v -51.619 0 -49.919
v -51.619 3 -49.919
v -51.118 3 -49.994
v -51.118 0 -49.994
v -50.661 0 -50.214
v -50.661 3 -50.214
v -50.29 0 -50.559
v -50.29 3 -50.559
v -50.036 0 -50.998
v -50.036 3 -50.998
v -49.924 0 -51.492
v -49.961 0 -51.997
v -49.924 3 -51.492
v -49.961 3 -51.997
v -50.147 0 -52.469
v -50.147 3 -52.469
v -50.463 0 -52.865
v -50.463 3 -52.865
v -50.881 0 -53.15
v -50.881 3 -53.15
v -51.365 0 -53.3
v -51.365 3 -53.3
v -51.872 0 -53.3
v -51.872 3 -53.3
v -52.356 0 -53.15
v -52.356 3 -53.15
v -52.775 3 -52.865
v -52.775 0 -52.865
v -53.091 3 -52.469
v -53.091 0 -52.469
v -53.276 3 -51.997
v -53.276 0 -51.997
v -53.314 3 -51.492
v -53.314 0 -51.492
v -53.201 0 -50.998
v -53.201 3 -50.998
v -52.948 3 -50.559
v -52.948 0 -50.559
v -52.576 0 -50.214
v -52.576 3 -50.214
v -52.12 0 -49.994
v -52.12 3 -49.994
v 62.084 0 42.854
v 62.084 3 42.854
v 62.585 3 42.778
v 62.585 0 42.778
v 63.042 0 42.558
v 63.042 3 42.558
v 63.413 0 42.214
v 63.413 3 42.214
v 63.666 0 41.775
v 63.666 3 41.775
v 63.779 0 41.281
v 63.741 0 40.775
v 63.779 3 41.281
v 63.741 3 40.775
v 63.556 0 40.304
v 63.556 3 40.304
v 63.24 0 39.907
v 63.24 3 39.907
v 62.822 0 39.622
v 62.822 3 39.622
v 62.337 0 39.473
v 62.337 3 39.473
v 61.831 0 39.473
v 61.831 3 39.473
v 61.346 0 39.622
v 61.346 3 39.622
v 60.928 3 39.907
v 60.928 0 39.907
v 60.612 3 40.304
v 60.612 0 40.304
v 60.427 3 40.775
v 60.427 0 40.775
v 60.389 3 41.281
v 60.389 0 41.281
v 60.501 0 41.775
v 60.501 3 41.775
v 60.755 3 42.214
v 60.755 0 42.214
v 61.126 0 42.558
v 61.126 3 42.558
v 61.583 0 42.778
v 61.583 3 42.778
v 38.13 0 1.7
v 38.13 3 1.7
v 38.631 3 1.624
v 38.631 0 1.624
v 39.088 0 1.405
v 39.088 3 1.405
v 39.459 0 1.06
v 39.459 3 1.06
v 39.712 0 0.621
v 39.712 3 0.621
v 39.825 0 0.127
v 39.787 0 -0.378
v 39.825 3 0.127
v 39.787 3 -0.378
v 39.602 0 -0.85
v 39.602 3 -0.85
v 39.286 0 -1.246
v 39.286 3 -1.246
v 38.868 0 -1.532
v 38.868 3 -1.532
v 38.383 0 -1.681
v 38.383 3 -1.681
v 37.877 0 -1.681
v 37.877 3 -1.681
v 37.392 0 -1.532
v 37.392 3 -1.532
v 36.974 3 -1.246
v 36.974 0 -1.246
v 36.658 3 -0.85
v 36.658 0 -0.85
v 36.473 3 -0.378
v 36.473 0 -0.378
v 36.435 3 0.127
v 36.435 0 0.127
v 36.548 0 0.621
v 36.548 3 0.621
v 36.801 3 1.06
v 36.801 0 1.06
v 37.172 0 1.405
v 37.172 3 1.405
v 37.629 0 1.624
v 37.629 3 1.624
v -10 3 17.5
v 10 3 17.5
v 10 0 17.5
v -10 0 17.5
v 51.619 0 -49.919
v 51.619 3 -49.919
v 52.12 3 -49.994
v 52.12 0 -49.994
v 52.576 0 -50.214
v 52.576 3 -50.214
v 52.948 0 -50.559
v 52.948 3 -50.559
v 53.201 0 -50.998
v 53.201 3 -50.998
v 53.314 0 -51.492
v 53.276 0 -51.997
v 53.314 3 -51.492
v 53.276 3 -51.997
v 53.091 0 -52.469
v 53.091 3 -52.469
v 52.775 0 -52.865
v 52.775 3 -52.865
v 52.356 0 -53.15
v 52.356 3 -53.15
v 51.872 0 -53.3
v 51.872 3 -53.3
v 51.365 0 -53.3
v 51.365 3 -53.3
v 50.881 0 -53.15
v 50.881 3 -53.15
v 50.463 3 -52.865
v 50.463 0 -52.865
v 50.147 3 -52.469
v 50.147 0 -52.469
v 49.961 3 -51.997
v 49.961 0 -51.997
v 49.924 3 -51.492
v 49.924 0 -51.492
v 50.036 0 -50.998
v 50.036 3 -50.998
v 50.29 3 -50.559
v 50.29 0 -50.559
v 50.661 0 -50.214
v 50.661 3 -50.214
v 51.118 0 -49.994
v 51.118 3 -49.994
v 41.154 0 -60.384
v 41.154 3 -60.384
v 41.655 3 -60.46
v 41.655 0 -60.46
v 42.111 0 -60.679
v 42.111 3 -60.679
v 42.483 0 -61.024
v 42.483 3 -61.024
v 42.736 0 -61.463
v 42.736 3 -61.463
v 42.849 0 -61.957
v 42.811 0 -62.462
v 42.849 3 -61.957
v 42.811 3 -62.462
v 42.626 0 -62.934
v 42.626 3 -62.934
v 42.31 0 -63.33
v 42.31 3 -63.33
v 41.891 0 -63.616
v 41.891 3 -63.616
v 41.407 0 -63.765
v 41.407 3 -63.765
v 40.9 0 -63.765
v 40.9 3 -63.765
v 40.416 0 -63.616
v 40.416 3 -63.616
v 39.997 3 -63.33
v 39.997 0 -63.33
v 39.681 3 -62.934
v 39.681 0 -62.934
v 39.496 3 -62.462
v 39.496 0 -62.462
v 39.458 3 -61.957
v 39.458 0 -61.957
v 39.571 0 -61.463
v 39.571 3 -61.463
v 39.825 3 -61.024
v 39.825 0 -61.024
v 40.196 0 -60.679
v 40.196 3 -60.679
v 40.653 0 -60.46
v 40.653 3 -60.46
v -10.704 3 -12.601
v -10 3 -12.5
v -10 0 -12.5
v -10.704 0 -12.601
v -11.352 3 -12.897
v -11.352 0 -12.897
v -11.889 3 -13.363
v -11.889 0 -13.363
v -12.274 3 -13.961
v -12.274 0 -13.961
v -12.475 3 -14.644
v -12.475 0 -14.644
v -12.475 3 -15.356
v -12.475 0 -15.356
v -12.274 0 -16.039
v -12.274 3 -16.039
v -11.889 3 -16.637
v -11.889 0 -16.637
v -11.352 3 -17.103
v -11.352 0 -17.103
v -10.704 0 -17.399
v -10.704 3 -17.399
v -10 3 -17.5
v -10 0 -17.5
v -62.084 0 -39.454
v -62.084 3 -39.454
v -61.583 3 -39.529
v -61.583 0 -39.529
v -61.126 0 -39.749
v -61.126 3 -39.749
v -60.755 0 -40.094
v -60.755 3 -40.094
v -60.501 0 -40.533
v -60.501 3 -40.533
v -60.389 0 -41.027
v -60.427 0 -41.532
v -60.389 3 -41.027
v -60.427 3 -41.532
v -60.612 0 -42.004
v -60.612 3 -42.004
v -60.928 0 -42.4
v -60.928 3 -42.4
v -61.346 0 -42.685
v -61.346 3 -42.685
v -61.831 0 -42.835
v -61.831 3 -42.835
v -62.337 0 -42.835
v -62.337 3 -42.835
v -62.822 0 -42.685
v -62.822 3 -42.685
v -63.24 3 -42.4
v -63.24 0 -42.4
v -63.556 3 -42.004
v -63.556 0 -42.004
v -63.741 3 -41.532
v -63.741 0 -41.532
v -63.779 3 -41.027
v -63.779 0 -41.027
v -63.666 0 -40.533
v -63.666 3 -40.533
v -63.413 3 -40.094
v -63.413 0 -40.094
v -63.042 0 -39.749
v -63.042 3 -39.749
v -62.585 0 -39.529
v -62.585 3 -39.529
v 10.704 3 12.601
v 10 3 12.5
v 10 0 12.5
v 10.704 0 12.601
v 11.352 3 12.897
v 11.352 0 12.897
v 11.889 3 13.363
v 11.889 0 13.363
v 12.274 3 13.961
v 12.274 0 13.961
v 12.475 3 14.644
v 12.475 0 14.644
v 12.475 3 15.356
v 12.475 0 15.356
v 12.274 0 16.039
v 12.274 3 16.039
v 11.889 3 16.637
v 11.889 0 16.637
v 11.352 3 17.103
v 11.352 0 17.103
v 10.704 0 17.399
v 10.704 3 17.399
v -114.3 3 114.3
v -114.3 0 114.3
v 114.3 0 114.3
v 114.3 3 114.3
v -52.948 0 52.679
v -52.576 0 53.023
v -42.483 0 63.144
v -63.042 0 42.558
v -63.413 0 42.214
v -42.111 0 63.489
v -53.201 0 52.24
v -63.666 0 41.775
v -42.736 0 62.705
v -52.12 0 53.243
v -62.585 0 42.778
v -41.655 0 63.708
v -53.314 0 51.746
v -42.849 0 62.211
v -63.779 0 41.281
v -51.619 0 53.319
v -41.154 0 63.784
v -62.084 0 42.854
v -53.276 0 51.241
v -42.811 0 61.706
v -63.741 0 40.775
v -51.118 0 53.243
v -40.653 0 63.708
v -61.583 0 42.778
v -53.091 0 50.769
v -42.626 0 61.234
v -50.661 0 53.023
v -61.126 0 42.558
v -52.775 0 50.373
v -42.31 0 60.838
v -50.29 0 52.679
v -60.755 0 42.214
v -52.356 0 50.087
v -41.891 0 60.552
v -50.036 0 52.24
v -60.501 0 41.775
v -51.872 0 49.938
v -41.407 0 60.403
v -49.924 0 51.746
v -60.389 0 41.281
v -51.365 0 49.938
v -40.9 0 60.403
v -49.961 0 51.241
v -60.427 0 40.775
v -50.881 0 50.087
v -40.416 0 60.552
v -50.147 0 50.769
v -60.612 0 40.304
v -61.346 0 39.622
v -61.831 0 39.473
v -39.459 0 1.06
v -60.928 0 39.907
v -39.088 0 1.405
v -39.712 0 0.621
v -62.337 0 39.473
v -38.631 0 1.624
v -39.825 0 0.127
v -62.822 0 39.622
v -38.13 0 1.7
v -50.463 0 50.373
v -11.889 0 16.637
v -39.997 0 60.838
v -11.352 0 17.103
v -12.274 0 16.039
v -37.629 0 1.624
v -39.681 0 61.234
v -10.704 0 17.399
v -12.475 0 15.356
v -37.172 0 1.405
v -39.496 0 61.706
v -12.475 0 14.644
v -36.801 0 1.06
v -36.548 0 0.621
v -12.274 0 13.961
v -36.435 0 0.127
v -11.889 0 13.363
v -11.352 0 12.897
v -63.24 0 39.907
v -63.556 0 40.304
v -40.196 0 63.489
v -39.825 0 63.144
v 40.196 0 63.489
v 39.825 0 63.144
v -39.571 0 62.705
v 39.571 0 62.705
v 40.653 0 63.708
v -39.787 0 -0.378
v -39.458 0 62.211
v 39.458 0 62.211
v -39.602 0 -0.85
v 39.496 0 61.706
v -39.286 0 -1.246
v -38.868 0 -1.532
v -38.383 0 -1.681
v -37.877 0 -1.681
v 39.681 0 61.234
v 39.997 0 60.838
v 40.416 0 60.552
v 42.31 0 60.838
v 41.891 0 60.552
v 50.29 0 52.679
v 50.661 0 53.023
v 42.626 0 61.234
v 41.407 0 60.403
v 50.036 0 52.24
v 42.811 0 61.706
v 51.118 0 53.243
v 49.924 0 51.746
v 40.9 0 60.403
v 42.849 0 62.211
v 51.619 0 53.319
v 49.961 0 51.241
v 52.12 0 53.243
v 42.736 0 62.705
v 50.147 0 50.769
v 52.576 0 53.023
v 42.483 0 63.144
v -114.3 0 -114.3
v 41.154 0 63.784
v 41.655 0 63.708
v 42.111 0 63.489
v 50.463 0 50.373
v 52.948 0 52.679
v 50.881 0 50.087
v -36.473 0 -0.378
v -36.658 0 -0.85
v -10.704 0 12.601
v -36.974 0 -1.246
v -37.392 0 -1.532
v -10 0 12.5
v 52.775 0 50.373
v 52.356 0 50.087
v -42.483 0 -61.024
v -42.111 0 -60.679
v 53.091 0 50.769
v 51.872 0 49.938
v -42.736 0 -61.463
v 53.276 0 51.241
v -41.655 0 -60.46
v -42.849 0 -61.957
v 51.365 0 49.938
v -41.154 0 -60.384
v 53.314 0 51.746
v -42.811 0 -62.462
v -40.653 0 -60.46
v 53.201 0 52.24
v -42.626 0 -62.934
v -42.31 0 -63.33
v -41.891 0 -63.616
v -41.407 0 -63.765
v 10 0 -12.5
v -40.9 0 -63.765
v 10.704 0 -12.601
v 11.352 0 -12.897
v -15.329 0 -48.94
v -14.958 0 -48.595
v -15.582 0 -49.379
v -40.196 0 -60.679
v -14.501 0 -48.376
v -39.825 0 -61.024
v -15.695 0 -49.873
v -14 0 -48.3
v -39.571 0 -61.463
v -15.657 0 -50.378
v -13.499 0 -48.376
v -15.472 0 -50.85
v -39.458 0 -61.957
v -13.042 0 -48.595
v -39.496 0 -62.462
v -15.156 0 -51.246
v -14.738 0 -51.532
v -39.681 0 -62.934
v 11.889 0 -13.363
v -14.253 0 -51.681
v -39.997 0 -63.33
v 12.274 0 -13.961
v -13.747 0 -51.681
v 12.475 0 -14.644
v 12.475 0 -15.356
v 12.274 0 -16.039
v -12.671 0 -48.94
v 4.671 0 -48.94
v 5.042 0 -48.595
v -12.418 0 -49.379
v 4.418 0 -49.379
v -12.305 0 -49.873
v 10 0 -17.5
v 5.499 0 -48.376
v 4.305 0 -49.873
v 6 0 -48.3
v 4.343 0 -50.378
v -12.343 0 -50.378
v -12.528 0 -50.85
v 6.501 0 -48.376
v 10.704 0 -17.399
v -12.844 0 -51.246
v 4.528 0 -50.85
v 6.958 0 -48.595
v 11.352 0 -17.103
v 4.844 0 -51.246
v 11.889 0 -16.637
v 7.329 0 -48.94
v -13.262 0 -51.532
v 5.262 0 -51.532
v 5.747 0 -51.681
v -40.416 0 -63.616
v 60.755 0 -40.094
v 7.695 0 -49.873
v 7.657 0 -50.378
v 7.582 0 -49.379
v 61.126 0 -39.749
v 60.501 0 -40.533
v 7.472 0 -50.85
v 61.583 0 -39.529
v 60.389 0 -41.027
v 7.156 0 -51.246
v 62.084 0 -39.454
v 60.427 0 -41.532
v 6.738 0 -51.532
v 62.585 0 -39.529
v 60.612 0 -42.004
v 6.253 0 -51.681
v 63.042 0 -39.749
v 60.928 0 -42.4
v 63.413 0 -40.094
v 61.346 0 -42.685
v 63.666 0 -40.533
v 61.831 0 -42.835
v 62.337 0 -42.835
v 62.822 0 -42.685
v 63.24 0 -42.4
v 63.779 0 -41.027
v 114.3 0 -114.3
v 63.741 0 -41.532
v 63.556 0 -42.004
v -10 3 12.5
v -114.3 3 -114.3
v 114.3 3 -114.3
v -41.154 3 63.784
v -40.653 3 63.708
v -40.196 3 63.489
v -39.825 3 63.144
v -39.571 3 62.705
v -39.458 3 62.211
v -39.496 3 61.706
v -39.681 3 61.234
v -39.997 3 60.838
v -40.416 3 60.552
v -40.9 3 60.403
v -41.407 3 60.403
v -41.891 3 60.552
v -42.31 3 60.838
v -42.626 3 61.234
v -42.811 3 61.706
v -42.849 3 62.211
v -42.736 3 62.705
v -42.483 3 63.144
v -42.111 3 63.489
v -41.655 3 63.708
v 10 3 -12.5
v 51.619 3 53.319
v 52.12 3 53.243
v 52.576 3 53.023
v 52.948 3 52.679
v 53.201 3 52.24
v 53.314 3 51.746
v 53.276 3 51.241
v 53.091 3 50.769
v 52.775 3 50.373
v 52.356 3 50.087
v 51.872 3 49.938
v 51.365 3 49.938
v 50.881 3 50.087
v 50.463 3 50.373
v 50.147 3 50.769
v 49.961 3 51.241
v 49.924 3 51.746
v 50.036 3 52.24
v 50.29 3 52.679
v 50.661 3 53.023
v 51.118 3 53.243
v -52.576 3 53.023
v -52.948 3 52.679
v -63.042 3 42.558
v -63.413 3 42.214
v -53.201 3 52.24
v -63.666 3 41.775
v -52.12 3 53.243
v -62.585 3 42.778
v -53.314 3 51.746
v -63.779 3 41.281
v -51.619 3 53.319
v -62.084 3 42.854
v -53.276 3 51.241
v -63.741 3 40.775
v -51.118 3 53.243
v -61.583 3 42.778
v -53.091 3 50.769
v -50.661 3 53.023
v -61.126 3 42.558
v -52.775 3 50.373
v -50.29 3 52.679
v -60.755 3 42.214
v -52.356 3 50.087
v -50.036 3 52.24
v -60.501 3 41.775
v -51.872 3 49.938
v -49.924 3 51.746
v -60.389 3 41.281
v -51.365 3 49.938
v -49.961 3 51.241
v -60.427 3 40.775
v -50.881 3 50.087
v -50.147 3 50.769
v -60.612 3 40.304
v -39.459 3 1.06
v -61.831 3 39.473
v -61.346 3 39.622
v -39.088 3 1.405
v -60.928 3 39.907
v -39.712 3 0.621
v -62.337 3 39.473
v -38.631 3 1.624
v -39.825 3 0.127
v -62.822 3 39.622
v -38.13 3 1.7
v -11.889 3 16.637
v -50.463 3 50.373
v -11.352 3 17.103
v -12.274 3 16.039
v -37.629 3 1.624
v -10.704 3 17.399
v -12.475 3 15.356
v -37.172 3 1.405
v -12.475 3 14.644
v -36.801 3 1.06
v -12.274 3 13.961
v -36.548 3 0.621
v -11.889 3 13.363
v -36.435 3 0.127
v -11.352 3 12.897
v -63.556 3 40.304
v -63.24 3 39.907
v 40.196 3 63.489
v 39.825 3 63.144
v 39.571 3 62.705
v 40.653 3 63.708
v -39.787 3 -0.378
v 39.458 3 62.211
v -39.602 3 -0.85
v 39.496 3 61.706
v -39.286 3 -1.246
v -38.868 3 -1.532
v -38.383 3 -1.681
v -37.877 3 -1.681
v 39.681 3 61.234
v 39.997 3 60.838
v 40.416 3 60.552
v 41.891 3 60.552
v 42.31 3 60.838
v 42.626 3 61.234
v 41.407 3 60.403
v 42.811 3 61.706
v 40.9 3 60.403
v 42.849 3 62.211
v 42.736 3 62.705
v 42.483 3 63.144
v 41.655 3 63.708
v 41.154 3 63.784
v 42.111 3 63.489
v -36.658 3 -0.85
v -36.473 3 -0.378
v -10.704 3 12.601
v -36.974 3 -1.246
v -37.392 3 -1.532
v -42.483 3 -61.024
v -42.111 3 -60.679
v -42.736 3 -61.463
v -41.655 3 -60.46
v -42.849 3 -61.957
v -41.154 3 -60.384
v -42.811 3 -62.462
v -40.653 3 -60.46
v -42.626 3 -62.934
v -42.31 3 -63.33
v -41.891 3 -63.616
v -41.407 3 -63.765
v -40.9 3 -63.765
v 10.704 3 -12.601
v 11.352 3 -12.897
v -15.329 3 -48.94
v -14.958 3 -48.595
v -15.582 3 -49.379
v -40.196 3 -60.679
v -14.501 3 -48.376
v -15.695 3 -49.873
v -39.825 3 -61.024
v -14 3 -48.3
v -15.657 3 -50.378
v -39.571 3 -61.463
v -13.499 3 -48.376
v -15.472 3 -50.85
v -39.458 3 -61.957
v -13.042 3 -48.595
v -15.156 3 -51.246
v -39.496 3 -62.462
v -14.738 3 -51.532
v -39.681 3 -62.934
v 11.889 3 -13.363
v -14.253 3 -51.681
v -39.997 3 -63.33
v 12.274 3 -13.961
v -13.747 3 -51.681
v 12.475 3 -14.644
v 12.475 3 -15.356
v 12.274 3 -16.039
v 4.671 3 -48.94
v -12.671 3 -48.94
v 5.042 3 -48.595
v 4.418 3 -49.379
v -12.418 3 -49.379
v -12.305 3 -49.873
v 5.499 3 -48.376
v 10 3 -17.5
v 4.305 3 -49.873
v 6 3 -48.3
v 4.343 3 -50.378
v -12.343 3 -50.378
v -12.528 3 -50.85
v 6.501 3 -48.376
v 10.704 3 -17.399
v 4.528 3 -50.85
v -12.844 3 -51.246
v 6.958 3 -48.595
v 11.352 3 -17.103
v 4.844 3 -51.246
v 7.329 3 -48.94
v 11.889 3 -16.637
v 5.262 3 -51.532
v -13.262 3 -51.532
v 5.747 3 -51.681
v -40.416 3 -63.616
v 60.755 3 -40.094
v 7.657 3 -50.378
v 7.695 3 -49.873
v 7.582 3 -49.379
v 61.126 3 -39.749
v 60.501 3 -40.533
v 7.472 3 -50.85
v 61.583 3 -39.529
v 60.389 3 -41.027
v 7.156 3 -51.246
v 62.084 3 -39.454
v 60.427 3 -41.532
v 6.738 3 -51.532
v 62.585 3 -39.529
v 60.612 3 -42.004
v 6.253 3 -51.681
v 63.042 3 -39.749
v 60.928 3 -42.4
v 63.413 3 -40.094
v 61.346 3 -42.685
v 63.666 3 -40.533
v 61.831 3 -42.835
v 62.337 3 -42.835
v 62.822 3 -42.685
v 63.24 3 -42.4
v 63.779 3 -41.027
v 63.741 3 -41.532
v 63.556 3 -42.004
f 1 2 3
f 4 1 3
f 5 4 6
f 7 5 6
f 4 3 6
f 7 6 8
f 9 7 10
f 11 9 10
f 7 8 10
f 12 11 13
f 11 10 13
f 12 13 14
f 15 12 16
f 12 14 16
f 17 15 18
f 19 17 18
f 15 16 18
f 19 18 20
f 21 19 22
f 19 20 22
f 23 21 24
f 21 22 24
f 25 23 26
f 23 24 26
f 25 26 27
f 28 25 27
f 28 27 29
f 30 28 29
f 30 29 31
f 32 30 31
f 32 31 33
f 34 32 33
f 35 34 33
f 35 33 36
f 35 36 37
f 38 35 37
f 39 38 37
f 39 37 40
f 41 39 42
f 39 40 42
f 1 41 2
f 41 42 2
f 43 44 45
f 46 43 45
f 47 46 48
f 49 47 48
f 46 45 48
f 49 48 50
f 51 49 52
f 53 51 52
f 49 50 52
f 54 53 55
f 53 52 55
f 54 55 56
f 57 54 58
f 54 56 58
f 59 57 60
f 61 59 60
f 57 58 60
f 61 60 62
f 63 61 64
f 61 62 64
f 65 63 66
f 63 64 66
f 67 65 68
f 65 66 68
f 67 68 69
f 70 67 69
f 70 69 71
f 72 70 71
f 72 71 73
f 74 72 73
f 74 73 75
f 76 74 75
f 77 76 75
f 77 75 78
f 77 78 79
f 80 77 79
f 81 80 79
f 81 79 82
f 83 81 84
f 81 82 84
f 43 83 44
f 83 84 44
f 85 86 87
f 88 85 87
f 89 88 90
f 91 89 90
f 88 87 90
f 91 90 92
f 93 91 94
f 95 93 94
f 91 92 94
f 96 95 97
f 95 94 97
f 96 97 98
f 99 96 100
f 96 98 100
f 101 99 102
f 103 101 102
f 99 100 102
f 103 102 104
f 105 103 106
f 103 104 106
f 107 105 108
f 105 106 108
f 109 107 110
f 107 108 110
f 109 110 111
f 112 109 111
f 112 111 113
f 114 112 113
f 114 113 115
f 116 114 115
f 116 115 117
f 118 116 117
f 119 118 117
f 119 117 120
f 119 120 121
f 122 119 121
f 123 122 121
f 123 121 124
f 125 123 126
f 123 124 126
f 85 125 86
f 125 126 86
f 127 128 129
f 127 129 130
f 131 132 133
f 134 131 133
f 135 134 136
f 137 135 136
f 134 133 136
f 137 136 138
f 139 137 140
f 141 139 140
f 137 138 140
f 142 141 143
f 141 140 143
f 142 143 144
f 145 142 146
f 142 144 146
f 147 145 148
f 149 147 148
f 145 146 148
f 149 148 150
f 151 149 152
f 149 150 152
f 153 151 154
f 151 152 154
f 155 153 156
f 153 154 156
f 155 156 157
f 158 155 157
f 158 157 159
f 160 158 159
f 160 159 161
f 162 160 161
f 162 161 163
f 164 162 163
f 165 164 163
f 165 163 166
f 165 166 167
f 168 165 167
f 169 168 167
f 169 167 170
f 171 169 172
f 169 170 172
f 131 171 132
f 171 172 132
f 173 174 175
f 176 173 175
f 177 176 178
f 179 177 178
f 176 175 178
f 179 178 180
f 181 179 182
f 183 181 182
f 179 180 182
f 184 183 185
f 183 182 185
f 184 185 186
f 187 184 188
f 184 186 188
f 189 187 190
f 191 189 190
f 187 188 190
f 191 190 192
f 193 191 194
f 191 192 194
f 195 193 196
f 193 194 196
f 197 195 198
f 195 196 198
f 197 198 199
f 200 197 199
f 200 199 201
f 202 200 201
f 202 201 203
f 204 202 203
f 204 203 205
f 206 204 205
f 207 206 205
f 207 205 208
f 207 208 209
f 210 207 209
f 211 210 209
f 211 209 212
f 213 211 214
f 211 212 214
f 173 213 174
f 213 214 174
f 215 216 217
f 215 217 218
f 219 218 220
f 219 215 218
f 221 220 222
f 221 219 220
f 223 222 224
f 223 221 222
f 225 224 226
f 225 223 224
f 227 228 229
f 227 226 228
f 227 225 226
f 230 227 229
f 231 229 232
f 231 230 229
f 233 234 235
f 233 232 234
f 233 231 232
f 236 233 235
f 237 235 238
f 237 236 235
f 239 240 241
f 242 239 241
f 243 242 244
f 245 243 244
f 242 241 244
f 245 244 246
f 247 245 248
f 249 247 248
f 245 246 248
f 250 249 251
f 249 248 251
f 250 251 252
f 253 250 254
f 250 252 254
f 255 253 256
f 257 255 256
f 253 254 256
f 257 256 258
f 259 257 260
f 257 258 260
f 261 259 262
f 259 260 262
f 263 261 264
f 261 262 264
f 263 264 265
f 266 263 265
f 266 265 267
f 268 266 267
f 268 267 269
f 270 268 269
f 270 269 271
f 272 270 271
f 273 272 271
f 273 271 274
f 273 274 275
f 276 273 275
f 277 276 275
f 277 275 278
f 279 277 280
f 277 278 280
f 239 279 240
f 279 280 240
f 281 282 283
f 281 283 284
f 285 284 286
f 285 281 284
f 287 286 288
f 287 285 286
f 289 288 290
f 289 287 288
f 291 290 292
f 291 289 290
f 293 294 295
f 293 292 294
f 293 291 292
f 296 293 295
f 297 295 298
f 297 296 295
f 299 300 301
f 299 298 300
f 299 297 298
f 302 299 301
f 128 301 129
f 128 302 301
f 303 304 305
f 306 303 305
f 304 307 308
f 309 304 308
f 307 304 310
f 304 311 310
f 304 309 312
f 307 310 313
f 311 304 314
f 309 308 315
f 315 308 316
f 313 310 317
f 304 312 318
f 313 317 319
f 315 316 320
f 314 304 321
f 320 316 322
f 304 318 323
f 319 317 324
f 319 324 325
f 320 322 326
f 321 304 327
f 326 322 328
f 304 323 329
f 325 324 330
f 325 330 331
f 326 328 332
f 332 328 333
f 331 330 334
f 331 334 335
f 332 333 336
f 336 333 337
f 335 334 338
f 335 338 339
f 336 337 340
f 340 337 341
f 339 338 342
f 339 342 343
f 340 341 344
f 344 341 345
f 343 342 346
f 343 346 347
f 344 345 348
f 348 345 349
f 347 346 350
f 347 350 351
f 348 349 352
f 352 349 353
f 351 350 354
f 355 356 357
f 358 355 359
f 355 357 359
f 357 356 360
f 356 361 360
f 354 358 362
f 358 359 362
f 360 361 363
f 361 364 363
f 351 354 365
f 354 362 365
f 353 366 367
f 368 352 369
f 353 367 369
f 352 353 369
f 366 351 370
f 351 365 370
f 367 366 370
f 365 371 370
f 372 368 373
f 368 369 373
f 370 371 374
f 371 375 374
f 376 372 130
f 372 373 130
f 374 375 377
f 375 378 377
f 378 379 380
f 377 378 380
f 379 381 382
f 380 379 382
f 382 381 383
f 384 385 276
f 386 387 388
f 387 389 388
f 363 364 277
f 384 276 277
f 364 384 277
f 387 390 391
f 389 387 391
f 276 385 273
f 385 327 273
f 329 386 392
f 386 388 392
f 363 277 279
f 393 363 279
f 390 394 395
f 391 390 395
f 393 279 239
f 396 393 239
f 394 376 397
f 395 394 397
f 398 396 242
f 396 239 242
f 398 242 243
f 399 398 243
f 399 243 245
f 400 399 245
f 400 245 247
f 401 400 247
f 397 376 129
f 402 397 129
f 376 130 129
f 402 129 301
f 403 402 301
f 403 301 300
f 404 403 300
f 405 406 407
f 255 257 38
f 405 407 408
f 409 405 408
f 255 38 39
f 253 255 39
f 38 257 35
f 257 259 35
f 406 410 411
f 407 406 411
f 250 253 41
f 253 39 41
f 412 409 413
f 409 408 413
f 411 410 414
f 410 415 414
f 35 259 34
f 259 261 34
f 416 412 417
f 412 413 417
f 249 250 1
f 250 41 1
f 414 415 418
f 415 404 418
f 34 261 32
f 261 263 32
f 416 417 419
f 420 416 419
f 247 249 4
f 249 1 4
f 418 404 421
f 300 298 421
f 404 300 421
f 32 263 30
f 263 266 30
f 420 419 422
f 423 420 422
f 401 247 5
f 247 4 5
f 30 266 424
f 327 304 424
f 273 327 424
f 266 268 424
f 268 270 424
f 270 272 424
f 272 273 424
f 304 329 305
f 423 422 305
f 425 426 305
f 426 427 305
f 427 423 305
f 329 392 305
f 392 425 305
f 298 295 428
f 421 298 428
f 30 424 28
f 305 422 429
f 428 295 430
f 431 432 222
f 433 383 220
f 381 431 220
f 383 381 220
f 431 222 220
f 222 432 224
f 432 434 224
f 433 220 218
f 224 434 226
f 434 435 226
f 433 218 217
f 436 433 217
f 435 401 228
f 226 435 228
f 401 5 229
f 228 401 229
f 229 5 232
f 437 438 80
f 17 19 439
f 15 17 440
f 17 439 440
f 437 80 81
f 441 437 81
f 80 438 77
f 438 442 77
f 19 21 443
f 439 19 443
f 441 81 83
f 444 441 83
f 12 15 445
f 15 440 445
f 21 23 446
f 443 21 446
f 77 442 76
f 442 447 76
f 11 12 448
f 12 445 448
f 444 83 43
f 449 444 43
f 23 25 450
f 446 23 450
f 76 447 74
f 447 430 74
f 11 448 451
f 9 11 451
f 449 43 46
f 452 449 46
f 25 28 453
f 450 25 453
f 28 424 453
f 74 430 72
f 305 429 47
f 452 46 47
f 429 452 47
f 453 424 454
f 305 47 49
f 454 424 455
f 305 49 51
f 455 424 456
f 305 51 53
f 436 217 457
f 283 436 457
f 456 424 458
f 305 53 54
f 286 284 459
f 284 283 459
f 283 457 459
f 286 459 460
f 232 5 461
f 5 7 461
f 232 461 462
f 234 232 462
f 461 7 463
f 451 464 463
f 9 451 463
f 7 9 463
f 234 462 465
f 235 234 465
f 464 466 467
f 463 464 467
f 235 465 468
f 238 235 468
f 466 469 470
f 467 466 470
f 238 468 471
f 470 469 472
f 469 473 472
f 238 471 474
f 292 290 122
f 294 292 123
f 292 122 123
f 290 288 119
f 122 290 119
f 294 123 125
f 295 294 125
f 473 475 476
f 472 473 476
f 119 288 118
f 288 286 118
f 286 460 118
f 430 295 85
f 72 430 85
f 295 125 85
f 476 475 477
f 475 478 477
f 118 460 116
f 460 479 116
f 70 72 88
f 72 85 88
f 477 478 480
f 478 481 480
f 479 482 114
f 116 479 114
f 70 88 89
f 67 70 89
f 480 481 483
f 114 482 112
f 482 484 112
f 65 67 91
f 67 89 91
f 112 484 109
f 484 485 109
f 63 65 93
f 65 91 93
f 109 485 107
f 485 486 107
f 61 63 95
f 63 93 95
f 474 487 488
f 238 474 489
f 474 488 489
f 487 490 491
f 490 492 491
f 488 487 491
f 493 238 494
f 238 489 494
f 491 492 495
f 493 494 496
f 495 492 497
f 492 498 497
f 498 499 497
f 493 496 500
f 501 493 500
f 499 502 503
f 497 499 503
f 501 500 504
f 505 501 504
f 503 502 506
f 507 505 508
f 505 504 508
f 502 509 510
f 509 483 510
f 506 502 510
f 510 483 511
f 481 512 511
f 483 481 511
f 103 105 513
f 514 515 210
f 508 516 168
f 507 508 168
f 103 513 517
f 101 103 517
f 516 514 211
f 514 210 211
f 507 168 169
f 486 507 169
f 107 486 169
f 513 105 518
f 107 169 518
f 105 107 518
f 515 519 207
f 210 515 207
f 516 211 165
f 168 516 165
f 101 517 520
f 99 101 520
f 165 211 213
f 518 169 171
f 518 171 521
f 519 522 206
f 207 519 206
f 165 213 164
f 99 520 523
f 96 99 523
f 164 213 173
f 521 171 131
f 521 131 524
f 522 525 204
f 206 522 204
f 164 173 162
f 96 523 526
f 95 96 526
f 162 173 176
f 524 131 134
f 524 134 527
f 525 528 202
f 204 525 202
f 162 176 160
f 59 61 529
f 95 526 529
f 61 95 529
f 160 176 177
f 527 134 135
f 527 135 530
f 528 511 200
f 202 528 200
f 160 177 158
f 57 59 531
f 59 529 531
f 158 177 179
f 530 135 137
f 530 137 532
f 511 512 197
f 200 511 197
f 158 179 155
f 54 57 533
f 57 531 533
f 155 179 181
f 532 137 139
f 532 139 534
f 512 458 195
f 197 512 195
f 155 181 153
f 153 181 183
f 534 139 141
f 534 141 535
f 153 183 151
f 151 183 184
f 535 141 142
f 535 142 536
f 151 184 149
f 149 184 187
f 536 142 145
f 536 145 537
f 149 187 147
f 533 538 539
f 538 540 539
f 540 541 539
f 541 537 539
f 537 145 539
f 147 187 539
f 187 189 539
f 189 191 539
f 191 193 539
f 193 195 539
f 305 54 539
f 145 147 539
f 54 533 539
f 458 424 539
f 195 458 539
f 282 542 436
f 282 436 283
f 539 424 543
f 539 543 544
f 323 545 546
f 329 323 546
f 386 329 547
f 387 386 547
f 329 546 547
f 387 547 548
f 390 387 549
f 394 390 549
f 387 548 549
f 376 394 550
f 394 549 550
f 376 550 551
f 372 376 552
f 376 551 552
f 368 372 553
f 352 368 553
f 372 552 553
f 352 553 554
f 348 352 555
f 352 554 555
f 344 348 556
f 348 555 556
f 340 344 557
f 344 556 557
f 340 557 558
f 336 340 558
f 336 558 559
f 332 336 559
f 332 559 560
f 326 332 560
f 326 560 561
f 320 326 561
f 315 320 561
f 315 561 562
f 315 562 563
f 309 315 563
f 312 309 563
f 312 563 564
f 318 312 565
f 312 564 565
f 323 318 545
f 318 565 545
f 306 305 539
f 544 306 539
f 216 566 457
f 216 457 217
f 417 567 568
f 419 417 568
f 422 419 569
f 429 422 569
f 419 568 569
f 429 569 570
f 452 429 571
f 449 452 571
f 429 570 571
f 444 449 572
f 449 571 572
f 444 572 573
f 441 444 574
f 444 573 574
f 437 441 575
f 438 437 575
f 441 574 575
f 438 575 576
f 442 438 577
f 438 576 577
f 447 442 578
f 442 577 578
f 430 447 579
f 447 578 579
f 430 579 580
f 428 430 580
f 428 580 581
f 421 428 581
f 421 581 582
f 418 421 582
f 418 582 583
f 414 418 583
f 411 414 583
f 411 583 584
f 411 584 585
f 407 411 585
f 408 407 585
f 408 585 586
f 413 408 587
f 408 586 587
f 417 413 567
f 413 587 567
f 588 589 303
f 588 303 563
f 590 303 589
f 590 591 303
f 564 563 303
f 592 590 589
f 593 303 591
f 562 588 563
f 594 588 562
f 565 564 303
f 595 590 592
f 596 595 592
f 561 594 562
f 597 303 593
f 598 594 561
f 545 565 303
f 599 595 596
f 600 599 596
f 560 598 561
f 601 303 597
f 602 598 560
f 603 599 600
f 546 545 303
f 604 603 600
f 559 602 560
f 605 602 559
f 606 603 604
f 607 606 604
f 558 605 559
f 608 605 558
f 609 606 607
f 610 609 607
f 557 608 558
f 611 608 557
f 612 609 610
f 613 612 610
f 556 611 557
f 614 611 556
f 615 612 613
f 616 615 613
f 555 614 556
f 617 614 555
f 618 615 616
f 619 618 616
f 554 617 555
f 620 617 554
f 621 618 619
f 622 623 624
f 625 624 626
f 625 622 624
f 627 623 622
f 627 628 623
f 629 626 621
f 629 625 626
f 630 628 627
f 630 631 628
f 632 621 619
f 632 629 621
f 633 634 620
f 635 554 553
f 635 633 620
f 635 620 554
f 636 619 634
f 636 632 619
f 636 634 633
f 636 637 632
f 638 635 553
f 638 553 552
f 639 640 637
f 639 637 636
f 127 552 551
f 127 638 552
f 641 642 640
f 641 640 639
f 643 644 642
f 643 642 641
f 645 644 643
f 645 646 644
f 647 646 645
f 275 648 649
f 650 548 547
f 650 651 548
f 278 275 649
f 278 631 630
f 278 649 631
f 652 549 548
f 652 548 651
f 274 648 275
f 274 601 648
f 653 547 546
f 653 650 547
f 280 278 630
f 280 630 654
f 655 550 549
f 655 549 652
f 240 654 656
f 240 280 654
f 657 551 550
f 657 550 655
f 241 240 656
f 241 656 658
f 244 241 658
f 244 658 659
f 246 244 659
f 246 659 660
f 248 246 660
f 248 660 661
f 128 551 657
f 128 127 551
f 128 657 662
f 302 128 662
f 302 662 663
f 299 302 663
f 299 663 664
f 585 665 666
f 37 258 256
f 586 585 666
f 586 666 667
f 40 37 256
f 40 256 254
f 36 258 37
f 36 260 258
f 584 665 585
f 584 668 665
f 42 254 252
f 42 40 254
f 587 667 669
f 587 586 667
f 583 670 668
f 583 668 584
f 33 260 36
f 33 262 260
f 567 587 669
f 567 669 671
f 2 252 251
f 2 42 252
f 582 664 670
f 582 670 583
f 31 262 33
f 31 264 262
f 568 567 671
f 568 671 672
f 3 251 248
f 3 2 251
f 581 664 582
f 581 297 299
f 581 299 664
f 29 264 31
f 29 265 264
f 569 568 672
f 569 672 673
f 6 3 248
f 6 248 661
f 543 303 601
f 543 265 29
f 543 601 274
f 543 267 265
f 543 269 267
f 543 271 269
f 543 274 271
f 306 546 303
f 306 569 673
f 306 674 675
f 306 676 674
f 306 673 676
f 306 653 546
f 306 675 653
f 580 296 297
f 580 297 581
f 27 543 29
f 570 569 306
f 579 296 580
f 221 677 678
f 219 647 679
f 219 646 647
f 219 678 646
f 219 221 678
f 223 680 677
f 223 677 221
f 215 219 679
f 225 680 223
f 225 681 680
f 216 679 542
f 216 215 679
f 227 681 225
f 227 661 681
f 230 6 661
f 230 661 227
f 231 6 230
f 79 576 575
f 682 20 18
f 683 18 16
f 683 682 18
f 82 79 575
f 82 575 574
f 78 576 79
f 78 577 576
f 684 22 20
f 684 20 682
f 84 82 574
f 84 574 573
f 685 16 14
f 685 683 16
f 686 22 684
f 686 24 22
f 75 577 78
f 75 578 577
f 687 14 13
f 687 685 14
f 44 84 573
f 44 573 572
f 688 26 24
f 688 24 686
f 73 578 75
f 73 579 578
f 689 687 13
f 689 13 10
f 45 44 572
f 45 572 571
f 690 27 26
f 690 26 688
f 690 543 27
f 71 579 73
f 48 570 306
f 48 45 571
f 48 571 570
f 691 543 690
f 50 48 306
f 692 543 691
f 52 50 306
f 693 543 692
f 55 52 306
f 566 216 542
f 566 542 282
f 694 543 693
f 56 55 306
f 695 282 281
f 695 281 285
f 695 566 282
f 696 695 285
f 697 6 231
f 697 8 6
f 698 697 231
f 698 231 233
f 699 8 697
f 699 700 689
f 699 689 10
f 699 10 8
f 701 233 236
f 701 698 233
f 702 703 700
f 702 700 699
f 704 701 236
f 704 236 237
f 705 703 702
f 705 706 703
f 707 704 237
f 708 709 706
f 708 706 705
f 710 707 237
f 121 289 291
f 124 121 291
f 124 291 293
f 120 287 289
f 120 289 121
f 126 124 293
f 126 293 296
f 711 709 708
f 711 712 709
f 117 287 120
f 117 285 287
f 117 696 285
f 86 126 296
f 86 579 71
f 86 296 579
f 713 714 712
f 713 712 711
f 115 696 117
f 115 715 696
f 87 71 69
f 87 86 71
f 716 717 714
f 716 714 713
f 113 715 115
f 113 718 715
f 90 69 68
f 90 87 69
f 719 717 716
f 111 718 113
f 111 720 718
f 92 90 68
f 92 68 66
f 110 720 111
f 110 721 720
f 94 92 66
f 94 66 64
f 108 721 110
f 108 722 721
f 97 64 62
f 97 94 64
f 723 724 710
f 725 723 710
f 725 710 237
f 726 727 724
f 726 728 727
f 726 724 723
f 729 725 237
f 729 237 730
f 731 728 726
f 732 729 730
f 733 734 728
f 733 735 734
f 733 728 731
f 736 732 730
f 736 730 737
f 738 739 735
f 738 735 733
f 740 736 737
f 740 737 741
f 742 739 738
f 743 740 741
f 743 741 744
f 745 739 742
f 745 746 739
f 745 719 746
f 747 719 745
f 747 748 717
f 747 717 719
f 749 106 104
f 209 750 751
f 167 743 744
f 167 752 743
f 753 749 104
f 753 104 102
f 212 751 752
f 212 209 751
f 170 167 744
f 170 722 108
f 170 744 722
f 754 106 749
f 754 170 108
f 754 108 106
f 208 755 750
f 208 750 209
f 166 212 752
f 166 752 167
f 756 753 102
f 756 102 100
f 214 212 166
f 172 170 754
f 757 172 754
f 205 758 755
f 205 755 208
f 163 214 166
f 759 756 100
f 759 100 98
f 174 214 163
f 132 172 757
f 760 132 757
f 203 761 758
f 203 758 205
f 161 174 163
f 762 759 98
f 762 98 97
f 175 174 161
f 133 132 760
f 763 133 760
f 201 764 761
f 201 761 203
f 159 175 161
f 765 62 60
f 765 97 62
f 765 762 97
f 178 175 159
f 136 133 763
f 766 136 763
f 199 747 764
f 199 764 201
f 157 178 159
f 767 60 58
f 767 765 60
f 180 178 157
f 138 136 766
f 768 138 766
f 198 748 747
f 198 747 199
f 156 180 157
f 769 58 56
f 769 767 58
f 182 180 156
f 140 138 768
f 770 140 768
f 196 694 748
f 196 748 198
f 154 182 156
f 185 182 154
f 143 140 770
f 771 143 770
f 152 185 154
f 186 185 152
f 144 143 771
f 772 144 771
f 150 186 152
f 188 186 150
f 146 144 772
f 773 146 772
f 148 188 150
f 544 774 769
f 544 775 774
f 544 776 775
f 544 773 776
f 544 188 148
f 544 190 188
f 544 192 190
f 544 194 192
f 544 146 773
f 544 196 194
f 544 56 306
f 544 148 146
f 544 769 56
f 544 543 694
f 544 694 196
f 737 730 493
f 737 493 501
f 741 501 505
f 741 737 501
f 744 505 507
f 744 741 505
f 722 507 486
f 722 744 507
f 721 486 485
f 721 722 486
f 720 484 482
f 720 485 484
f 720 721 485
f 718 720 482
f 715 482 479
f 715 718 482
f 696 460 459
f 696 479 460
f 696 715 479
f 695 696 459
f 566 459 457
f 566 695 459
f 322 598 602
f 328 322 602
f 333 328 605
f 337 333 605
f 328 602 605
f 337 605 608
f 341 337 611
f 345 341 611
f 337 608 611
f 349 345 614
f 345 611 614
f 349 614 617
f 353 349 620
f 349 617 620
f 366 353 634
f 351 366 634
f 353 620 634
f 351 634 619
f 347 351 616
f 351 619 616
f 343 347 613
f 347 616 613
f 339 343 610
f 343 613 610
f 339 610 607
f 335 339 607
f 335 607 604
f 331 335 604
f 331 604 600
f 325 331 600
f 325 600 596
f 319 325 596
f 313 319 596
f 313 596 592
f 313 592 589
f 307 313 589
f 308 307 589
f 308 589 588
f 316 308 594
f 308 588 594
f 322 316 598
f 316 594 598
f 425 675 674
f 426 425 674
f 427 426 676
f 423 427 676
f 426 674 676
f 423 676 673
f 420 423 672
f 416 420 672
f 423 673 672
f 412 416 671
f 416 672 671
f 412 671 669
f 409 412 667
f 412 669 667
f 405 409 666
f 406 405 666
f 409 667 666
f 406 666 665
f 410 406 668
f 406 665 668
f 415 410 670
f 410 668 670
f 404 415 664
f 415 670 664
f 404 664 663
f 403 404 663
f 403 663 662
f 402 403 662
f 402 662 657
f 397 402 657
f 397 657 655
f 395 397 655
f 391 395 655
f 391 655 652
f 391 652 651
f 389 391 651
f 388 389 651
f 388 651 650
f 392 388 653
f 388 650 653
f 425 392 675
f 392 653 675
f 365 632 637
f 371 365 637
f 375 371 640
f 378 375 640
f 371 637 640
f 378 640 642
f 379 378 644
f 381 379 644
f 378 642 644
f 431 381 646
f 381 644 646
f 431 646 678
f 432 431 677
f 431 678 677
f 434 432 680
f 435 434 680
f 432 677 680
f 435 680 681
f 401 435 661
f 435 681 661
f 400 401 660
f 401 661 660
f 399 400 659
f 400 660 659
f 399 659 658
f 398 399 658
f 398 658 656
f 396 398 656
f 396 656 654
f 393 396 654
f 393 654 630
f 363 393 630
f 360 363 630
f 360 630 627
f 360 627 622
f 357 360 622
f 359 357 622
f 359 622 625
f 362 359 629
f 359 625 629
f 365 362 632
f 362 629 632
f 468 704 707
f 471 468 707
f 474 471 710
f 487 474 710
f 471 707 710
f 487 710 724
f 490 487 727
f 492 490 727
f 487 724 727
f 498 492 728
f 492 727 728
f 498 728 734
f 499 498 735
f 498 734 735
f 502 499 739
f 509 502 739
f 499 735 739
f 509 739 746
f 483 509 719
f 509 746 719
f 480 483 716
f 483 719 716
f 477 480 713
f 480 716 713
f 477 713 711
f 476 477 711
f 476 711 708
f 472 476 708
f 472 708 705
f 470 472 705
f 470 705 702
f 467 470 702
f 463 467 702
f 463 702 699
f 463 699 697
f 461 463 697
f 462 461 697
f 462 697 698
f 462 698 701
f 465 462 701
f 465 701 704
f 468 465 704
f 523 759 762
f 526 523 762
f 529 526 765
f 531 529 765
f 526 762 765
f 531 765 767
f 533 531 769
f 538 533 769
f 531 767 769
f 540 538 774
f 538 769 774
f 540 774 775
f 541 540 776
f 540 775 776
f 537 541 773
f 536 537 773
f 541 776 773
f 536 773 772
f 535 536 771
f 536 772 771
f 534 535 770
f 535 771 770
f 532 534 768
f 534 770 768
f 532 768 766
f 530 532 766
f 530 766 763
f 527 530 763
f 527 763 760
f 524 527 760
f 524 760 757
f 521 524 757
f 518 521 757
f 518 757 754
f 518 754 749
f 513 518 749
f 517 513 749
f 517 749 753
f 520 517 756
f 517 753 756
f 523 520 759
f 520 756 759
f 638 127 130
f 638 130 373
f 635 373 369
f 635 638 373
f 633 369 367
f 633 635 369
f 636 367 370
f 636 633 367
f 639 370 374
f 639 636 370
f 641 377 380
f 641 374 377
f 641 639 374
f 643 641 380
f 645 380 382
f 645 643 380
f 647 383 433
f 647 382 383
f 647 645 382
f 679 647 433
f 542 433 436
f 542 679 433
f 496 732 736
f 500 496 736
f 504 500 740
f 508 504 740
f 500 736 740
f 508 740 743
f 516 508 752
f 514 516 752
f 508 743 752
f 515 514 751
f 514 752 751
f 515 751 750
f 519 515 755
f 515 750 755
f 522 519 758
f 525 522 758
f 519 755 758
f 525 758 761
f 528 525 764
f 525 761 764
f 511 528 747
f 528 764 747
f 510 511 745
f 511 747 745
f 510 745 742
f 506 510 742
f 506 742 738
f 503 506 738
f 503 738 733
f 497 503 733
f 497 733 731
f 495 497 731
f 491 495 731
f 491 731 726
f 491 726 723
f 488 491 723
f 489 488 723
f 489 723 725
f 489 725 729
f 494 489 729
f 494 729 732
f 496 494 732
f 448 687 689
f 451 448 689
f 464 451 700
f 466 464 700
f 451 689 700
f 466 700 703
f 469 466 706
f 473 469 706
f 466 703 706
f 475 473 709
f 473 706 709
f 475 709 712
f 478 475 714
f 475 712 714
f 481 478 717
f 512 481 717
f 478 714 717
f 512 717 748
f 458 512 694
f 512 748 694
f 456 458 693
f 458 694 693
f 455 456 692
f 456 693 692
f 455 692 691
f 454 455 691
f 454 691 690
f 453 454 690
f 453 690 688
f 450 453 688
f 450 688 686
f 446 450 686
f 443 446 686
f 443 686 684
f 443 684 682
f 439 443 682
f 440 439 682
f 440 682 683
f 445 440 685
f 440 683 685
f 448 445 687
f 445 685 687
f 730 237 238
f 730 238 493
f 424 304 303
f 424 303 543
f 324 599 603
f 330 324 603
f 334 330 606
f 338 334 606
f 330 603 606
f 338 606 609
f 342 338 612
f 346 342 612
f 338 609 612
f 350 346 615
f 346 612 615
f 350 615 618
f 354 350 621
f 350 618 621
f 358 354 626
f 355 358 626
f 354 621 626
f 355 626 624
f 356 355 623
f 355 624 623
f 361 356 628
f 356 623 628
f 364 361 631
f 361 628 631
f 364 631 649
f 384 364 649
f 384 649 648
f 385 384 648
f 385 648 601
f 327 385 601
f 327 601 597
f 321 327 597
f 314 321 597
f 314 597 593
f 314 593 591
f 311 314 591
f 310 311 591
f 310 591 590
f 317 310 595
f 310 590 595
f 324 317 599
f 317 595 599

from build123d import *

# Parameters (mm, degrees)
SKETCH1_W                                   = 228.6
SKETCH1_H                                   = 228.6
PLATE_DEPTH                                 = 3
SKETCH8_R                                   = 1.7
MOTOR_MOUNT_HOLES_DEPTH                     = 3
SKETCH9_R                                   = 1.7
CONNECTOR_BOARD_HOLES_DEPTH                 = 3
MOTOR_CONTROLLER_HOLDER_ARDUINO_HOLES_REACH = 163.672
SKETCH11_R                                  = 1.7
CABLE_SLOTS_REACH                           = 163.672


with BuildPart() as part:
    # Sketch1 → plate (new body)
    with BuildSketch(Plane(origin=(0, 0, 0), x_dir=(1, 0, 0), z_dir=(0, 1, 0))):
        Rectangle(SKETCH1_W, SKETCH1_H)
    extrude(amount=PLATE_DEPTH)

    # Sketch8 → motor-mount-holes (cut)
    with BuildSketch(Plane(origin=(0, 3, 0), x_dir=(1, 0, 0), z_dir=(0, 1, 0))):
        with Locations(Location((51.618795027, 51.618795027, 0), (0, 0, 270))):
            Circle(SKETCH8_R)
        with Locations(Location((62.083975388, 41.153614665, 0), (0, 0, 270))):
            Circle(SKETCH8_R)
        with Locations(Location((41.153614665, 62.083975388, 0), (0, 0, 270))):
            Circle(SKETCH8_R)
        with Locations(Location((51.618795027, -51.618795027, 0), (0, 0, 270))):
            Circle(SKETCH8_R)
        with Locations(Location((62.083975388, -41.153614665, 0), (0, 0, 270))):
            Circle(SKETCH8_R)
        with Locations(Location((41.153614665, -62.083975388, 0), (0, 0, 270))):
            Circle(SKETCH8_R)
        with Locations(Location((-51.618795027, -51.618795027, 0), (0, 0, 270))):
            Circle(SKETCH8_R)
        with Locations(Location((-41.153614665, -62.083975388, 0), (0, 0, 270))):
            Circle(SKETCH8_R)
        with Locations(Location((-62.083975388, -41.153614665, 0), (0, 0, 270))):
            Circle(SKETCH8_R)
        with Locations(Location((-51.618795027, 51.618795027, 0), (0, 0, 270))):
            Circle(SKETCH8_R)
        with Locations(Location((-62.083975388, 41.153614665, 0), (0, 0, 270))):
            Circle(SKETCH8_R)
        with Locations(Location((-41.153614665, 62.083975388, 0), (0, 0, 270))):
            Circle(SKETCH8_R)
    extrude(amount=-MOTOR_MOUNT_HOLES_DEPTH, mode=Mode.SUBTRACT)

    # Sketch9 → connector-board-holes (cut)
    with BuildSketch(Plane(origin=(0, 3, 0), x_dir=(1, 0, 0), z_dir=(0, 1, 0))):
        with Locations(Location((-38.13, 0, 0), (0, 0, 270))):
            Circle(SKETCH9_R)
        with Locations(Location((38.13, 0, 0), (0, 0, 270))):
            Circle(SKETCH9_R)
    extrude(amount=-CONNECTOR_BOARD_HOLES_DEPTH, mode=Mode.SUBTRACT)

    # Sketch11 → motor-controller-holder-arduino-holes (cut, up to next)
    with BuildSketch(Plane(origin=(0, 3, 0), x_dir=(1, 0, 0), z_dir=(0, 1, 0)), mode=Mode.PRIVATE) as motor_controller_holder_arduino_holes_sk1:
        with Locations(Location((-14, 50, 0), (0, 0, 270))):
            Circle(SKETCH11_R)
    motor_controller_holder_arduino_holes_tool1 = extrude(motor_controller_holder_arduino_holes_sk1.sketch, amount=-MOTOR_CONTROLLER_HOLDER_ARDUINO_HOLES_REACH, mode=Mode.PRIVATE) & part.part
    # Sketch11 → motor-controller-holder-arduino-holes (cut, up to next)
    with BuildSketch(Plane(origin=(0, 3, 0), x_dir=(1, 0, 0), z_dir=(0, 1, 0)), mode=Mode.PRIVATE) as motor_controller_holder_arduino_holes_sk2:
        with Locations(Location((6, 50, 0), (0, 0, 270))):
            Circle(SKETCH11_R)
    motor_controller_holder_arduino_holes_tool2 = extrude(motor_controller_holder_arduino_holes_sk2.sketch, amount=-MOTOR_CONTROLLER_HOLDER_ARDUINO_HOLES_REACH, mode=Mode.PRIVATE) & part.part
    add(motor_controller_holder_arduino_holes_tool1.solids().sort_by_distance((-14, 3, -50))[0], mode=Mode.SUBTRACT)
    add(motor_controller_holder_arduino_holes_tool2.solids().sort_by_distance((6, 3, -50))[0], mode=Mode.SUBTRACT)

    # Sketch12 → cable-slots (cut, up to next)
    with BuildSketch(Plane(origin=(0, 3, 0), x_dir=(1, 0, 0), z_dir=(0, 1, 0)), mode=Mode.PRIVATE) as cable_slots_sk1:
        with BuildLine():
            Line((-10, 17.5), (10, 17.5))
            ThreePointArc((10, 17.5), (12.5, 15), (10, 12.5))
            Line((10, 12.5), (-10, 12.5))
            ThreePointArc((-10, 12.5), (-12.5, 15), (-10, 17.5))
        make_face()
    cable_slots_tool1 = extrude(cable_slots_sk1.sketch, amount=-CABLE_SLOTS_REACH, mode=Mode.PRIVATE) & part.part
    # Sketch12 → cable-slots (cut, up to next)
    with BuildSketch(Plane(origin=(0, 3, 0), x_dir=(1, 0, 0), z_dir=(0, 1, 0)), mode=Mode.PRIVATE) as cable_slots_sk2:
        with BuildLine():
            Line((-10, -12.5), (10, -12.5))
            ThreePointArc((10, -12.5), (12.5, -15), (10, -17.5))
            Line((10, -17.5), (-10, -17.5))
            ThreePointArc((-10, -17.5), (-12.5, -15), (-10, -12.5))
        make_face()
    cable_slots_tool2 = extrude(cable_slots_sk2.sketch, amount=-CABLE_SLOTS_REACH, mode=Mode.PRIVATE) & part.part
    add(cable_slots_tool1.solids().sort_by_distance((0, 3, -15))[0], mode=Mode.SUBTRACT)
    add(cable_slots_tool2.solids().sort_by_distance((0, 3, 15))[0], mode=Mode.SUBTRACT)


solid = part.part
